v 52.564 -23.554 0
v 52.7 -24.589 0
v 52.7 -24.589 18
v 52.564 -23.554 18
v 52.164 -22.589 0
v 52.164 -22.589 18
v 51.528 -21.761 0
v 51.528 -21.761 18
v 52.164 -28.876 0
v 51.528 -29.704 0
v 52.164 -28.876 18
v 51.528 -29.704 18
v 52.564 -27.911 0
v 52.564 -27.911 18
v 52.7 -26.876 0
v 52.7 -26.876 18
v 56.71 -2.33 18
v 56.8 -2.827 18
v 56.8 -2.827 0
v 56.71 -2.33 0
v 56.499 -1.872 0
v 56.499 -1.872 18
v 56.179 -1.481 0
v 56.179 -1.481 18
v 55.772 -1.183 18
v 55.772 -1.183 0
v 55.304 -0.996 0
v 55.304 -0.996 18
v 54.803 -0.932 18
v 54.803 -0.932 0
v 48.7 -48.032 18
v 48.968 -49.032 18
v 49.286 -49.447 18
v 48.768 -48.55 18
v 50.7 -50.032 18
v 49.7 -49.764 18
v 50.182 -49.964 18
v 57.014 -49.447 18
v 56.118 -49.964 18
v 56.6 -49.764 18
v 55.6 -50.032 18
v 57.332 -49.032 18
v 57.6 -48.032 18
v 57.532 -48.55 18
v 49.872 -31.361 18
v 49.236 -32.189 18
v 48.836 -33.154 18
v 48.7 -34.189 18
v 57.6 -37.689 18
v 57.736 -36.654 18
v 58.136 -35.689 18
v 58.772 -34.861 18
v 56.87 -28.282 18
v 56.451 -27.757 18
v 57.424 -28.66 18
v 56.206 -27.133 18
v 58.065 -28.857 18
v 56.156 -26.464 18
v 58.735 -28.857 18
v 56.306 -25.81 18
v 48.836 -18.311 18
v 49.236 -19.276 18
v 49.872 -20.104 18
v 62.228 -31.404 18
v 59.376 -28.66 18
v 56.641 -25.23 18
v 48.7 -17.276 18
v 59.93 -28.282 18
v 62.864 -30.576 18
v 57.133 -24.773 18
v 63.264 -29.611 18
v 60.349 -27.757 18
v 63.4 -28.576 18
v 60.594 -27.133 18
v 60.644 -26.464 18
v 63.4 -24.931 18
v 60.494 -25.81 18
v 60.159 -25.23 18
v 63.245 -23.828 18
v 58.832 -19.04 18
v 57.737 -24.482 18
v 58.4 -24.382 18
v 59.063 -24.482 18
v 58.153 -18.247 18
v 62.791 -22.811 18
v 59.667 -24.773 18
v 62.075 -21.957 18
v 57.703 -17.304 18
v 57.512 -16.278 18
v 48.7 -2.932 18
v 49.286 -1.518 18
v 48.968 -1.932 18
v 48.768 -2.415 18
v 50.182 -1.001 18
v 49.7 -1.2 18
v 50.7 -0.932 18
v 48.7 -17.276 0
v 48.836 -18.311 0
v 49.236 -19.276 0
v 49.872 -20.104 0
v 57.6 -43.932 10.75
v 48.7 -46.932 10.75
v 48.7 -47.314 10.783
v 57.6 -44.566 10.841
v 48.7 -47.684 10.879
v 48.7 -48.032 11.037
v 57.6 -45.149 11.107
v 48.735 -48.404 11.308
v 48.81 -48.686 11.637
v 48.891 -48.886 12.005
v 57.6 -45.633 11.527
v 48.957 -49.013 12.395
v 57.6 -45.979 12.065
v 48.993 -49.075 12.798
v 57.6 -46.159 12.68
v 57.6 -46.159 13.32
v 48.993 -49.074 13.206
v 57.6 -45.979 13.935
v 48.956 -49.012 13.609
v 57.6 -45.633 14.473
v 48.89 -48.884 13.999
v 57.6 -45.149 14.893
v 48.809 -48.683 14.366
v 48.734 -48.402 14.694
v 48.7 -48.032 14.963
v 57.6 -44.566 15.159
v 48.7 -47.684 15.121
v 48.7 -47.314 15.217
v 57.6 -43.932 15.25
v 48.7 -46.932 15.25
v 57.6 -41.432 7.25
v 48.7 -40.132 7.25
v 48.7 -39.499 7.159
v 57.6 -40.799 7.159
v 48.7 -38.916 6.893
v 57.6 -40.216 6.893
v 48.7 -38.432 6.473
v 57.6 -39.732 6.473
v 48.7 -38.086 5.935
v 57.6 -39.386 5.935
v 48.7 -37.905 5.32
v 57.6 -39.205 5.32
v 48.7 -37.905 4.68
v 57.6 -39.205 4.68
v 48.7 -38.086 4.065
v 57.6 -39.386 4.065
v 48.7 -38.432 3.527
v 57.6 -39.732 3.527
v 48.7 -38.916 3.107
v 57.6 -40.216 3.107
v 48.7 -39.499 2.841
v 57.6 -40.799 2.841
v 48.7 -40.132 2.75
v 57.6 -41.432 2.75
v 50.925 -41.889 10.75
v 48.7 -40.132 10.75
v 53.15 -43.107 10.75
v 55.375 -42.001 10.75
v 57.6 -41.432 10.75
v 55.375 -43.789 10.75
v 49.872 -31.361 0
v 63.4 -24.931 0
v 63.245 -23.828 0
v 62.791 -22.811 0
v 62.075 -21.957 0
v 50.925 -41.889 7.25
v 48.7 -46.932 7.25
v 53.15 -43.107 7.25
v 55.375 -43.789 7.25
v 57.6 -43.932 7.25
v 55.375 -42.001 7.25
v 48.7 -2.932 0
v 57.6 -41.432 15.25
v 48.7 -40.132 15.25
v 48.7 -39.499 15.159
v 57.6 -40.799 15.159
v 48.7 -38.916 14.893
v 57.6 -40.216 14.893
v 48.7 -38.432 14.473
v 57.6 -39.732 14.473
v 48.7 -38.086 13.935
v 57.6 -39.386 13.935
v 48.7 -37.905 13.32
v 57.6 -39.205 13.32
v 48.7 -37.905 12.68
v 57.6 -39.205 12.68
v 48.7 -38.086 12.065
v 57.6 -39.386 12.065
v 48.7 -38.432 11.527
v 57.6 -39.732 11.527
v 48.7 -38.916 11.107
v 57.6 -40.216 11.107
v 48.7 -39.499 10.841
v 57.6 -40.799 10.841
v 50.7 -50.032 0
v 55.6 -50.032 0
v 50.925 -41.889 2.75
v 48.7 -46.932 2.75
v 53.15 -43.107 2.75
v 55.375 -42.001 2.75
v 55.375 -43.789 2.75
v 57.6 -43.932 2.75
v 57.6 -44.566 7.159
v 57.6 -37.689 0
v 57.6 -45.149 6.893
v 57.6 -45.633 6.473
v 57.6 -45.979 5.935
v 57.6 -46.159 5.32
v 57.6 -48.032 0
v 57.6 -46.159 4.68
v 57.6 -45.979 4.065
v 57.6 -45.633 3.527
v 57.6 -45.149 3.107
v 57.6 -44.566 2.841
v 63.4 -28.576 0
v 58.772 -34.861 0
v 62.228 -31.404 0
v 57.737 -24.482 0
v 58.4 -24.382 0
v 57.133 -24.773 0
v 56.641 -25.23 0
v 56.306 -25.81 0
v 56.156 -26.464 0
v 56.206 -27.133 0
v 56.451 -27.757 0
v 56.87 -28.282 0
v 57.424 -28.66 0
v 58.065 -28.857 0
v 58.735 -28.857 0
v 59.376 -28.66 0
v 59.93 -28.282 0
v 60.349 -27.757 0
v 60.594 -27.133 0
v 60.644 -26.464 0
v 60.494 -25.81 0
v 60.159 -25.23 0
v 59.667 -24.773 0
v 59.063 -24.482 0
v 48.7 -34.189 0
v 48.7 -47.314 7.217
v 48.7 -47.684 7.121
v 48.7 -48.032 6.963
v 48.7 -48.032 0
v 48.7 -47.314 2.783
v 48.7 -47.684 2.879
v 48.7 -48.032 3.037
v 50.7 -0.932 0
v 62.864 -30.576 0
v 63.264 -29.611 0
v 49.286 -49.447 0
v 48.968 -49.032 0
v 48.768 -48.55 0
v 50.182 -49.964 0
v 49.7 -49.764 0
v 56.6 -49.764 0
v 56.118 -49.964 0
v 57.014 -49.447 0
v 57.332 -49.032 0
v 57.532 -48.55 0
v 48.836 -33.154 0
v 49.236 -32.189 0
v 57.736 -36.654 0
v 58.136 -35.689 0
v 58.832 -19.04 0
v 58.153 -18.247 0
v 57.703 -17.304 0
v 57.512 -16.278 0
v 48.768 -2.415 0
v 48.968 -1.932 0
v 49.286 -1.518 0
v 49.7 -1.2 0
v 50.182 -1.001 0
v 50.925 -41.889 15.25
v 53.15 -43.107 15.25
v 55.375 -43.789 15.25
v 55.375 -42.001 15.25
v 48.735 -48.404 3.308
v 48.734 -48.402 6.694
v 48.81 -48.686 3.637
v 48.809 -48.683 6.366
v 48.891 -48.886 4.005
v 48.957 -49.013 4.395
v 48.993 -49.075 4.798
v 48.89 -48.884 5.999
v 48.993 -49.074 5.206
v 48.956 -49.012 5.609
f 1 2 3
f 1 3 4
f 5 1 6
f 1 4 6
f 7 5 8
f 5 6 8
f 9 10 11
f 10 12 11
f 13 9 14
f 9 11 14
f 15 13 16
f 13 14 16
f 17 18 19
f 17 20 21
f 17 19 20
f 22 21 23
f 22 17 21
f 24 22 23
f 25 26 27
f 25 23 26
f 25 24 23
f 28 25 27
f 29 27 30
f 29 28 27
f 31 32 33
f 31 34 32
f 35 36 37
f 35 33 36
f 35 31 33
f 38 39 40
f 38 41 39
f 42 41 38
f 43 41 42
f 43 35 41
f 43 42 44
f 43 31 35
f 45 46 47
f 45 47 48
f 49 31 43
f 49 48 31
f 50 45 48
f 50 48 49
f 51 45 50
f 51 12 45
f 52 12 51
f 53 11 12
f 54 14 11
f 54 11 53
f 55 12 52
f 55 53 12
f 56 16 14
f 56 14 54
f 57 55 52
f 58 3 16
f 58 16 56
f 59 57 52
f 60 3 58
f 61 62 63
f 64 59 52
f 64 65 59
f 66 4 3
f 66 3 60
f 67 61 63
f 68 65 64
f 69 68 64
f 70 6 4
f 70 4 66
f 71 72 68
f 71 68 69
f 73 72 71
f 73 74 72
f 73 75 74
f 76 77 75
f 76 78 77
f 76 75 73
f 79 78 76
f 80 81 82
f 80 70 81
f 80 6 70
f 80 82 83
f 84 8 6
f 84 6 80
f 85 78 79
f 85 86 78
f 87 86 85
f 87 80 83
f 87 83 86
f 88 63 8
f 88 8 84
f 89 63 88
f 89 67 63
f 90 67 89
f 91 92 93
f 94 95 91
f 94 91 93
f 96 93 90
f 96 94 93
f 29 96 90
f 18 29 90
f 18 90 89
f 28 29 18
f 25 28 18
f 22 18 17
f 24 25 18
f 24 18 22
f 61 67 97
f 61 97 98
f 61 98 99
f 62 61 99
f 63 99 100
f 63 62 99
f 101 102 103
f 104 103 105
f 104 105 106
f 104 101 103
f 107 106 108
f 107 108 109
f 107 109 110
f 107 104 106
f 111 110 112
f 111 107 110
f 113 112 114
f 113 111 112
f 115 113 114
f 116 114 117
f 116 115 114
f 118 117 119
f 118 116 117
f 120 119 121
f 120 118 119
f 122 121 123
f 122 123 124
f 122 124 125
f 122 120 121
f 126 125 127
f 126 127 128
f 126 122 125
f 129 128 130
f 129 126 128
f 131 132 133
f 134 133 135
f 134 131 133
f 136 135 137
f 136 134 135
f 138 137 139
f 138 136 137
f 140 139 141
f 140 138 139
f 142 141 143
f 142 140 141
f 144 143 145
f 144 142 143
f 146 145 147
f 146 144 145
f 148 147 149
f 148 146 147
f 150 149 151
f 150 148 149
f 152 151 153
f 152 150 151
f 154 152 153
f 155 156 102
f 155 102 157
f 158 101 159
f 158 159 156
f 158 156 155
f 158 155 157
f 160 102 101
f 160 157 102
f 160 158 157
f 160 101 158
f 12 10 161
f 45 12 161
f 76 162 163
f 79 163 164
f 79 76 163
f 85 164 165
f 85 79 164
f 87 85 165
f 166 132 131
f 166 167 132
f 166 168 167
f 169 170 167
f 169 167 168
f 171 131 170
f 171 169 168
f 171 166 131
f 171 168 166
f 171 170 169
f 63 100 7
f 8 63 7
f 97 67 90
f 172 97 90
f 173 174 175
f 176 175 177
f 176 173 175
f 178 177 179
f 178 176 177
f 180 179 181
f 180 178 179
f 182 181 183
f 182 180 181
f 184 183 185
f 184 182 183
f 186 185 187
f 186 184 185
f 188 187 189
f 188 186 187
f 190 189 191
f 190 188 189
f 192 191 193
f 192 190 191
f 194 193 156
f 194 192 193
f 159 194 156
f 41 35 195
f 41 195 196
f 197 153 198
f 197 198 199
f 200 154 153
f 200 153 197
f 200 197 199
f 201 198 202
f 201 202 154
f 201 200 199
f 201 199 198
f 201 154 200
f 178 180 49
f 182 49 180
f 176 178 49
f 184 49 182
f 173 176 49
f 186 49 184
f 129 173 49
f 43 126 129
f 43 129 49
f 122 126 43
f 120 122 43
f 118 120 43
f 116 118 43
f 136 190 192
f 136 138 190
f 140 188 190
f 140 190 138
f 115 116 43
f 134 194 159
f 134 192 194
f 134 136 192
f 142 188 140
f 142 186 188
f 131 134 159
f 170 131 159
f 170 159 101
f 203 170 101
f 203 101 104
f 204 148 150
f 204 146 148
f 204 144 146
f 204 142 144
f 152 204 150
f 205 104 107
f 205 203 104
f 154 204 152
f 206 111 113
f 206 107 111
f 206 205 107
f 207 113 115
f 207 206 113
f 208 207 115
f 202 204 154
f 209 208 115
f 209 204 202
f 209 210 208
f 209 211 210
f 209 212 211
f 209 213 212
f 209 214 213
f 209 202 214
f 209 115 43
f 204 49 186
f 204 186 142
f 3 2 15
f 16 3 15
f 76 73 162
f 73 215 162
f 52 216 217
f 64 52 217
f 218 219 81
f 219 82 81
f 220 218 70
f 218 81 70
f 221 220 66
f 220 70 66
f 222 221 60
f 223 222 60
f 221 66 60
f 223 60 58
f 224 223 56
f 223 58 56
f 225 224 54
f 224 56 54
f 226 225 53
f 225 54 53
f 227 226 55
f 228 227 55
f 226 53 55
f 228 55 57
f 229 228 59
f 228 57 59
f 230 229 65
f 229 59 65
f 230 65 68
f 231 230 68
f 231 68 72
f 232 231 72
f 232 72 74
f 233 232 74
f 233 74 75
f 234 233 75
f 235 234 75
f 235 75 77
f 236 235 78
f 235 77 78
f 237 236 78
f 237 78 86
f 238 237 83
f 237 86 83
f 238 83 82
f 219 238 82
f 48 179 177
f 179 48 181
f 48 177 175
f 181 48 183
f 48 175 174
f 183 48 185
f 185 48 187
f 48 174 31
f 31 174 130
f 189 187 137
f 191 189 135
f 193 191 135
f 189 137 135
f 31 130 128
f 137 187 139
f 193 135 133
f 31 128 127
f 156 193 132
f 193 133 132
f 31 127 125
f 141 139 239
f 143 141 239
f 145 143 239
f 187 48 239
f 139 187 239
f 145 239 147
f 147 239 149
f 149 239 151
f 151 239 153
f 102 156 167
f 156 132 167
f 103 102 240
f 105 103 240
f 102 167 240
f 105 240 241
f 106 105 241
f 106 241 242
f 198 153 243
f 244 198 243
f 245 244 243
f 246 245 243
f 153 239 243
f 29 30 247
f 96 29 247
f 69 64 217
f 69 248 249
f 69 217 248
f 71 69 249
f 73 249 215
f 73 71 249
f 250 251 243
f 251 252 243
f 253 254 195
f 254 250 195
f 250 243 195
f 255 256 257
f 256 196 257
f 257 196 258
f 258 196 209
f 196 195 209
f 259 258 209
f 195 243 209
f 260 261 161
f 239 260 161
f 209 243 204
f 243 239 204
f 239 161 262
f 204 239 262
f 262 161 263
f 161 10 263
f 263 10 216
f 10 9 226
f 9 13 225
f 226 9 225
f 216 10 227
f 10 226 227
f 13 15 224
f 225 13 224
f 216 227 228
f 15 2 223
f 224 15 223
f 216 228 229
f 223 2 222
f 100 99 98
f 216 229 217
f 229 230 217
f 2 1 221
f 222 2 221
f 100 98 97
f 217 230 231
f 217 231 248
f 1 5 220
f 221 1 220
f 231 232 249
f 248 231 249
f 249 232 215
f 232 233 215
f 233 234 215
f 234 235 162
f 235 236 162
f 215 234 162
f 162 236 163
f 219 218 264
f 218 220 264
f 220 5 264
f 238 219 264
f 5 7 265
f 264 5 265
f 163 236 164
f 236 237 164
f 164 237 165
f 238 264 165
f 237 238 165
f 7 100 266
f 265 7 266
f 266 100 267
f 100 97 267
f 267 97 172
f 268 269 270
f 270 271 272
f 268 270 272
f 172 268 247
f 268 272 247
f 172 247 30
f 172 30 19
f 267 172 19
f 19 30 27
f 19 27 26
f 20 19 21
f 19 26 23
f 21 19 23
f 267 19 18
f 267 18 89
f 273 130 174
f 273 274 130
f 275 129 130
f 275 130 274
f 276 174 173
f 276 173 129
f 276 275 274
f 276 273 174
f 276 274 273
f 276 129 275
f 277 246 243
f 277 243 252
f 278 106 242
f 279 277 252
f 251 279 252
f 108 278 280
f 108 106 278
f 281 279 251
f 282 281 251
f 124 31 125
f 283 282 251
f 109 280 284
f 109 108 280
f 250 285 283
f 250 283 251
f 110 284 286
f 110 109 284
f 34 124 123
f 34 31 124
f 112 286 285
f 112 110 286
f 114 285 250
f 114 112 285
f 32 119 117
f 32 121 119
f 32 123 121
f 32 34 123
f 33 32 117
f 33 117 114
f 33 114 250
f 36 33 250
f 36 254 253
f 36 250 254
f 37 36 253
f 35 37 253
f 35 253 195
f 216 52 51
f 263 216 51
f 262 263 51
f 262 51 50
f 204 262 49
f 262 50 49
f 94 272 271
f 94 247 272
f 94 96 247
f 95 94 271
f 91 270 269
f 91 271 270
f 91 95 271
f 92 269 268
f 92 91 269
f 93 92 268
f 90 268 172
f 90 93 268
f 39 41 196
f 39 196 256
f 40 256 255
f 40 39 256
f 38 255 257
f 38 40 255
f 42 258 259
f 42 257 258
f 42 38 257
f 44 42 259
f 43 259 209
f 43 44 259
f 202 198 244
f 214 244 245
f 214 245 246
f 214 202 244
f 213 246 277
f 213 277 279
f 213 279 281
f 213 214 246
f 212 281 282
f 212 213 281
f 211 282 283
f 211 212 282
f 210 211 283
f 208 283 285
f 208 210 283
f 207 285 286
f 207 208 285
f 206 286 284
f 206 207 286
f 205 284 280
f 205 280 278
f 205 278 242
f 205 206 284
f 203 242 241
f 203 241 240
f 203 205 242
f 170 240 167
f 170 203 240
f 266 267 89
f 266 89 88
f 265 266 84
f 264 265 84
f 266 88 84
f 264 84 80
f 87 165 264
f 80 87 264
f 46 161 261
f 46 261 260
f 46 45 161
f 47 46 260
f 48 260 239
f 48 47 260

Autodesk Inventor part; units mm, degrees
ref_plane "YZ Plane" through (0, 0, 0) normal (1, 0, 0) x (0, 1, 0)
ref_plane "XZ Plane" through (0, 0, 0) normal (0, 1, 0) x (-1, 0, 0)
ref_plane "XY Plane" through (0, 0, 0) normal (0, 0, 1) x (1, 0, 0)
sketch "Sketch1" plane through (0, 0, 0) normal (0, 0, 1) x (1, 0, 0)
  line L0 (-0.0471, -0.0824) -> (104.8002, -0.0824) construction
  line L1 (104.8002, -0.0824) -> (104.8002, -53.0533) construction
  line L2 (104.8002, -53.0533) -> (-0.0471, -53.0533) construction
  line L3 (-0.0471, -53.0533) -> (-0.0471, -0.0824) construction
  line L4 (48.7, -18.9324) -> (48.7, -0.9324)
  line L5 (56.7, -0.9324) -> (57.6, -17.9324)
  line L6 (57.6, -36.0324) -> (57.6, -50.0324)
  line L7 (48.7, -50.0324) -> (57.6, -50.0324)
  line L8 (56.7, -0.9324) -> (48.7, -0.9324)
  line L9 (48.7, -18.9324) -> (52.7, -22.9324)
  line L10 (52.7, -22.9324) -> (52.7, -28.5324)
  line L11 (52.7, -28.5324) -> (48.7, -32.5324)
  line L12 (57.6, -36.0324) -> (63.4, -30.2324)
  line L13 (63.4, -30.2324) -> (63.4, -23.1492)
  line L14 (63.4, -23.1492) -> (57.6, -17.9324)
  line L15 (48.7, -32.5324) -> (48.7, -50.0324)
  point P0 (0, 0)
  dimension "d19" = 49.1
  dimension "d44" = 8
  dimension "d68" = 48.7
  dimension "d74" = 135
  dimension "d77" = 135
  dimension "d82" = 0.9
  dimension "d85" = 10.7
  dimension "d86" = 135
  dimension "d87" = 135
  dimension "d96" = 0.85
  dimension "d104" = 18
  dimension "d105" = 17.5
  dimension "d117" = 8.9
  dimension "d120" = 14
  dimension "d121" = 17
  dimension "d124" = 4
extrude "Extrusion2" add sketch "Sketch1" along normal blind 18
fillet "Fillet3" radius 2 4 edges at (56.7, -0.9324, 9) (48.7, -0.9324, 9) (57.6, -50.0324, 9) (48.7, -50.0324, 9)
fillet "Fillet4" radius 4 8 edges at (48.7, -18.9324, 9) (57.6, -17.9324, 9) (52.7, -22.9324, 9) (52.7, -28.5324, 9) (48.7, -32.5324, 9) (57.6, -36.0324, 9) (63.4, -30.2324, 9) (63.4, -23.1492, 9)
sketch "Sketch2" plane through (48.7, -48.0324, 0) normal (-1, 0, 0) x (0, 0, 1)
  line L0 (0, 0) -> (0, 13.8431) projected
  line L1 (18, 13.8431) -> (18, 0) projected
  line L2 (0, -2) -> (18, -2) projected
  line L3 (5, 1.1) -> (5, 7.9) construction
  line L4 (7.25, 1.1) -> (7.25, 7.9)
  line L5 (2.75, 7.9) -> (2.75, 1.1)
  arc A0 (2.75, 1.1) -> (7.25, 1.1) centre (5, 1.1) ccw
  arc A1 (7.25, 7.9) -> (2.75, 7.9) centre (5, 7.9) ccw
  line L6 (13, 7.9) -> (13, 1.1) construction
  line L7 (10.75, 7.9) -> (10.75, 1.1)
  line L8 (15.25, 1.1) -> (15.25, 7.9)
  arc A2 (15.25, 7.9) -> (10.75, 7.9) centre (13, 7.9) ccw
  arc A3 (10.75, 1.1) -> (15.25, 1.1) centre (13, 1.1) ccw
  point P0 (0, 48.0324)
  point P1 (5, 4.5)
  point P2 (13, 4.5)
  dimension "d129" = 4.5
  dimension "d130" = 6.8
  dimension "d131" = 3.1
  dimension "d132" = 5
  dimension "d133" = 5
sketch "Sketch3" plane through (57.6, -48.0324, 18) normal (1, 0, 0) x (0, 0, -1)
  line L0 (5, 7.9) -> (5, 1.1) construction
  line L1 (13, 1.1) -> (13, 7.9) construction
  line L2 (5, 4.1) -> (5, 6.6) construction
  line L3 (7.25, 4.1) -> (7.25, 6.6)
  line L4 (2.75, 6.6) -> (2.75, 4.1)
  arc A0 (2.75, 4.1) -> (7.25, 4.1) centre (5, 4.1) ccw
  arc A1 (7.25, 6.6) -> (2.75, 6.6) centre (5, 6.6) ccw
  line L5 (13, 4.1) -> (13, 6.6) construction
  line L6 (10.75, 4.1) -> (10.75, 6.6)
  line L7 (15.25, 6.6) -> (15.25, 4.1)
  arc A2 (10.75, 4.1) -> (15.25, 4.1) centre (13, 4.1) ccw
  arc A3 (15.25, 6.6) -> (10.75, 6.6) centre (13, 6.6) ccw
  line L8 (0, -2) -> (18, -2) projected
  point P0 (18, 48.0324)
  point P1 (5, 5.35)
  point P2 (13, 5.35)
  dimension "d134" = 2.5
  dimension "d135" = 4.5
  dimension "d136" = 6.1
loft "Loft1" cut profiles "Sketch2", "Sketch3" contours A0 L5 A1 L4 / L6 A3 L7 A2
loft "Loft2" cut profiles "Sketch2", "Sketch3" contours A2 L8 A3 L7 / A0 L4 A1 L3
sketch "Sketch4" plane through (0, 0, 0) normal (0, 0, -1) x (-1, 0, 0)
  line L0 (-63.4, -24.9314) -> (-63.4, -28.5756) projected
  line L1 (-50.7, -0.9324) -> (-54.8031, -0.9324) projected
  point P0 (0, 0)
  point P1 (-58.4, -26.6324)
  dimension "d145" = 25.7
  dimension "d146" = 5
hole "Hole1" at (58.4, -26.6324, 0) direction (0, 0, 1) diameter 4.5 end through all
properties part number "ExtruderSatoerCamArm"
